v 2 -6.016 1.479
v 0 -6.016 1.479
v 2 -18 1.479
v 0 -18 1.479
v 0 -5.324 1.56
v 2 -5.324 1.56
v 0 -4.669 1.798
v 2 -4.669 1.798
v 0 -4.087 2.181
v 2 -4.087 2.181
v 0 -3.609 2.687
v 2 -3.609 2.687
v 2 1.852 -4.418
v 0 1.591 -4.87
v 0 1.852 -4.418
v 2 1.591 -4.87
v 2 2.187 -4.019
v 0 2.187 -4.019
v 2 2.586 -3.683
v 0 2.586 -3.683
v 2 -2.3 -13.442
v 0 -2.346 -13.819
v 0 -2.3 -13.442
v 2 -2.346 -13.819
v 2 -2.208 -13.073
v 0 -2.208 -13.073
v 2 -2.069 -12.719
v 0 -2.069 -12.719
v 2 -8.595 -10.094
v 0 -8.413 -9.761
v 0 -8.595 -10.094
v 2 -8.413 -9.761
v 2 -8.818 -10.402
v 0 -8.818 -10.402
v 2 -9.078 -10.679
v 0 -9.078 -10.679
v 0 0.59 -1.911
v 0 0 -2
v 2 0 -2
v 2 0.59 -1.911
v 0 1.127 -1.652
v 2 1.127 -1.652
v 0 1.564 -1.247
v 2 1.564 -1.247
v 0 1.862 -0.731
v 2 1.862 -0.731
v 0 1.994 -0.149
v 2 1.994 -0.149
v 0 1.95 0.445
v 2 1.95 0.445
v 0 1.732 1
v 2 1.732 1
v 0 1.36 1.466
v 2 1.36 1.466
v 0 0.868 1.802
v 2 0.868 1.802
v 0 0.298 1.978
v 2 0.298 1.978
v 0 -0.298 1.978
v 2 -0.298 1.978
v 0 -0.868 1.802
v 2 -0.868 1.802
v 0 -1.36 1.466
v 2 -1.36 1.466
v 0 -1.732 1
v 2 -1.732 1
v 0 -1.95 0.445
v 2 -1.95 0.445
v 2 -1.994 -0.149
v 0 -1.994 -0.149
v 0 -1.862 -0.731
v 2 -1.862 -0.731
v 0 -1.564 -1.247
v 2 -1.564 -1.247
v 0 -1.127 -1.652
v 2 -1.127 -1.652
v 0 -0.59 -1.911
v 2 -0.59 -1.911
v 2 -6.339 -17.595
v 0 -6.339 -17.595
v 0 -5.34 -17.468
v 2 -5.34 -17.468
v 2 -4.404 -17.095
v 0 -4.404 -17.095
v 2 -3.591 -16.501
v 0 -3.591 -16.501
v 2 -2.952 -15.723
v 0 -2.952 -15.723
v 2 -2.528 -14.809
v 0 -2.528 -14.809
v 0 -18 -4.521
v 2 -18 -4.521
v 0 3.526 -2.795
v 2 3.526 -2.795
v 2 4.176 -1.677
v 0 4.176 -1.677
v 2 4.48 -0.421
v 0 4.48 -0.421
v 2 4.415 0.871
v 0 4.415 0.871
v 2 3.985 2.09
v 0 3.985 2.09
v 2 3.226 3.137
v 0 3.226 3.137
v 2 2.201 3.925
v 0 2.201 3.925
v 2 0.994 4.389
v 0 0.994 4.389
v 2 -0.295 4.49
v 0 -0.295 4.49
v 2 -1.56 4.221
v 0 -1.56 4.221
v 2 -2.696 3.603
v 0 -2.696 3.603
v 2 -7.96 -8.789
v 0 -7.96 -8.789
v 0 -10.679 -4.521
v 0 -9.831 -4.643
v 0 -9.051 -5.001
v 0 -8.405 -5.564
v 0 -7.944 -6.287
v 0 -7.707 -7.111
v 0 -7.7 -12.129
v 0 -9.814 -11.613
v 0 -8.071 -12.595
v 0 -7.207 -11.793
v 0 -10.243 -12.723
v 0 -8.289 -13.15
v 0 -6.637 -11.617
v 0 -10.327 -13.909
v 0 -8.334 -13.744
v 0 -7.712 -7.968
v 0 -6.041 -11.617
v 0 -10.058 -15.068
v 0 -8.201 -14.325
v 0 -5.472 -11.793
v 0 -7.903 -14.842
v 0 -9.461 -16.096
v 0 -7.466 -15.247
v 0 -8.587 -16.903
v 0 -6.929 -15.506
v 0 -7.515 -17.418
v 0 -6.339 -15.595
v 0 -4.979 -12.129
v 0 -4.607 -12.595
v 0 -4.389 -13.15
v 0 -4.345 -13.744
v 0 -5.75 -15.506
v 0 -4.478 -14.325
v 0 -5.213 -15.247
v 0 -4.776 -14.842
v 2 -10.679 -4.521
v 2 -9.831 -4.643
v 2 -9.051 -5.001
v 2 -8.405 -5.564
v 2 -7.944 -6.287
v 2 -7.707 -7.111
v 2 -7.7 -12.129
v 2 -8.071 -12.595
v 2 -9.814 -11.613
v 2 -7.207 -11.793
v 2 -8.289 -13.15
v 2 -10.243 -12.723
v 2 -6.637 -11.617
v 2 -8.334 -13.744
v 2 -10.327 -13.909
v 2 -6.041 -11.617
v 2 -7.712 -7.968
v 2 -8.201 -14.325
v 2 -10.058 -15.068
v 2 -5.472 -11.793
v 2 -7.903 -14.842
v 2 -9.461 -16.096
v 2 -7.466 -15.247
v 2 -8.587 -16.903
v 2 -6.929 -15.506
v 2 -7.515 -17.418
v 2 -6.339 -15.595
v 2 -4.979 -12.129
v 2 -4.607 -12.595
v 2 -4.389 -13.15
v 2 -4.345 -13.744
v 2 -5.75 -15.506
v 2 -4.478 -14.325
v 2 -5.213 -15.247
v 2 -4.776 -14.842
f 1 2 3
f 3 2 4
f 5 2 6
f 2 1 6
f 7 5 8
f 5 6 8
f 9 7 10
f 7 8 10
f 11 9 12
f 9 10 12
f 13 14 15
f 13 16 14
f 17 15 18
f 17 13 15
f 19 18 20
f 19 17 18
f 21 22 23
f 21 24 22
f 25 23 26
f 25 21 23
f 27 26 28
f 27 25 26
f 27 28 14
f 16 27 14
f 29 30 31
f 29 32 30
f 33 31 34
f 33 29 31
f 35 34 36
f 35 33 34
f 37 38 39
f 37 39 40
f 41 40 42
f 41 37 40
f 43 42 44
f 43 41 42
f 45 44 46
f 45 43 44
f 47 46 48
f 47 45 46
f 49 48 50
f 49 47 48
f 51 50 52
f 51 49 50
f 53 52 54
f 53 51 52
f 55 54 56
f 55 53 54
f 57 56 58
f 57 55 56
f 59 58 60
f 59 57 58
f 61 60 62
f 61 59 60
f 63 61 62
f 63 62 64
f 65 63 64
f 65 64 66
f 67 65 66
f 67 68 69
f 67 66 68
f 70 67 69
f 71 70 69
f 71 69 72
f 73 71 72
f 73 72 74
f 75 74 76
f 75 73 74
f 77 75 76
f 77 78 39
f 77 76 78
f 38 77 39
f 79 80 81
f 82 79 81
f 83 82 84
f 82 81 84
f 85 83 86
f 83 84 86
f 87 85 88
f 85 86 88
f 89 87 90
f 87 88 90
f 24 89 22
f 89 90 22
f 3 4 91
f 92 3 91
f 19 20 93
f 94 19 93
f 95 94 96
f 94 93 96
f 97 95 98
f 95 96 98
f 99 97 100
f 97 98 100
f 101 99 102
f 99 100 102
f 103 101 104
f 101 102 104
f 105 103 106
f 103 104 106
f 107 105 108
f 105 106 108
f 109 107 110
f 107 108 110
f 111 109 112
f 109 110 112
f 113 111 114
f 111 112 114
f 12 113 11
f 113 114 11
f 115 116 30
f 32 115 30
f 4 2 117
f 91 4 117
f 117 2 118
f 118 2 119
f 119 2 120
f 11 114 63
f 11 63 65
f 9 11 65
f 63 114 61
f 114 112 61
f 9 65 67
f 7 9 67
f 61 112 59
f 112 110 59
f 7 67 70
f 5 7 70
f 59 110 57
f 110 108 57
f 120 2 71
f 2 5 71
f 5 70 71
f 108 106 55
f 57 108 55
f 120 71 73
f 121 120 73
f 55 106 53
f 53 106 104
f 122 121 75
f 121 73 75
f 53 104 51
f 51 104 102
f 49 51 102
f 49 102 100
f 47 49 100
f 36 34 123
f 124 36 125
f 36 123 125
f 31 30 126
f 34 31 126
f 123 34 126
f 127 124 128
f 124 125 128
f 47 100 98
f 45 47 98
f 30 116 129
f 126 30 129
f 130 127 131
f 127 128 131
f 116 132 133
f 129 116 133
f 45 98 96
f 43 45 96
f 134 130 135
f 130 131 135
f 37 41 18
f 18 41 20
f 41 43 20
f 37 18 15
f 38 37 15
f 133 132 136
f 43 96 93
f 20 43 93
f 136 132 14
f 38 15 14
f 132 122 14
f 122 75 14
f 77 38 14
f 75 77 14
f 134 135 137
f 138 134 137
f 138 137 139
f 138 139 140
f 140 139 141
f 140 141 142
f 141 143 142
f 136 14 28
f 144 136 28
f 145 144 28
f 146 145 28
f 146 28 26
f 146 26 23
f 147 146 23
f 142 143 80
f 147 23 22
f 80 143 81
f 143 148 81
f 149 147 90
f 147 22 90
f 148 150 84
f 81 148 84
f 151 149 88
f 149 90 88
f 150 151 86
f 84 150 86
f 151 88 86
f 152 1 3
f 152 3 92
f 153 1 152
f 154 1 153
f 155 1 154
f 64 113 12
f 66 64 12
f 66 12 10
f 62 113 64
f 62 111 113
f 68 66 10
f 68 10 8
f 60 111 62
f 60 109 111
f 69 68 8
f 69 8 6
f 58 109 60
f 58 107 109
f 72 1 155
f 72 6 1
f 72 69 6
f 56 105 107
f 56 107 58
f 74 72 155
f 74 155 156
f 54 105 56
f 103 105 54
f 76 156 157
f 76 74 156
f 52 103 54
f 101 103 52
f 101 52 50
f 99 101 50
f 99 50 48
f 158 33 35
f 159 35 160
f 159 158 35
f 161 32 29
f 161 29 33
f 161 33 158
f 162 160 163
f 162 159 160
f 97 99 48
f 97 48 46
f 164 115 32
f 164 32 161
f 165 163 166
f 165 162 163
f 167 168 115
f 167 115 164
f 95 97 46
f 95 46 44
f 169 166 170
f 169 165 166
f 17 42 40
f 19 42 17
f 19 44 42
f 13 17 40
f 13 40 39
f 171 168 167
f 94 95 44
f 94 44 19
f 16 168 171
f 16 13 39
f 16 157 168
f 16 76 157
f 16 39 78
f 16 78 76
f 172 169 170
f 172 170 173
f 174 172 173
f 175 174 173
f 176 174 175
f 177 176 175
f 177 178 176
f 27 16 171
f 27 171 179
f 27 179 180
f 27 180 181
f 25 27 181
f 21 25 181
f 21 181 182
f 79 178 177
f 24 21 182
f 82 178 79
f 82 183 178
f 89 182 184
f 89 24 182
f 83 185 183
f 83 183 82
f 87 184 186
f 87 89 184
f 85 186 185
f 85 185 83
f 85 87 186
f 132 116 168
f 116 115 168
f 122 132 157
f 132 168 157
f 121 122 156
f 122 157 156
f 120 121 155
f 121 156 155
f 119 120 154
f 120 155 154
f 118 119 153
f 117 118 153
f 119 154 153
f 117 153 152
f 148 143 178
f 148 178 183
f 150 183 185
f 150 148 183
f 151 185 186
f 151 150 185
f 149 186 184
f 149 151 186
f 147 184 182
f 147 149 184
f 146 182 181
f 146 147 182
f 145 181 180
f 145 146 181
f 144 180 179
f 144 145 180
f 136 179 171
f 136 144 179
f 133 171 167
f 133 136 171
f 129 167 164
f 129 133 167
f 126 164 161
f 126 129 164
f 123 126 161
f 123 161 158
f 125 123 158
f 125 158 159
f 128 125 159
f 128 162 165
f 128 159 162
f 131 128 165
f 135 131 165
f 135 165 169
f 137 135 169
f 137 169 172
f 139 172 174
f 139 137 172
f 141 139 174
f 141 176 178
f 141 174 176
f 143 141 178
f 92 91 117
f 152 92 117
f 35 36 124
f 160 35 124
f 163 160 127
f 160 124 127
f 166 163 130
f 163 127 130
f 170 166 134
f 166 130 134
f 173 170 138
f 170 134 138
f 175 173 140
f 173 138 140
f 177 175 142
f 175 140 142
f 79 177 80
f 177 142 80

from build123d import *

# Parameters (mm, degrees)
EXTRUDE_1_DEPTH          = 2
CUT_EXTRUDE_3_DEPTH      = 26.250159218
CUT_EXTRUDE_3_DEPTH_BACK = 26.250159218
SKETCH_1_3_R             = 2
FILLET_1_R               = 3


with BuildPart() as part:
    # 草图1 → 凸台-拉伸1 (new body)
    with BuildSketch(Plane(origin=(0, 0, 0), x_dir=(0, 0, -1), z_dir=(1, 0, 0))):
        with BuildLine():
            Line((1.479163916, 3.172077255), (-1.479163916, -3.172077255))
            Line((-1.479163916, -3.172077255), (3.19185305, -3.172077255))
            ThreePointArc((3.19185305, -3.172077255), (4.160128527, -1.715613779), (4.5, 0))
            ThreePointArc((4.5, 0), (4.384156276, 1.014482011), (4.042589444, 1.9767323))
            Line((4.042589444, 1.9767323), (1.479163916, 3.172077255))
        make_face()
        with BuildLine():
            Line((1.084261612, -4.36742221), (-1.479163916, -3.172077255))
            Line((-1.479163916, -3.172077255), (-1.479163916, -4.249949895))
            ThreePointArc((-1.479163916, -4.249949895), (-0.206002169, -4.495282317), (1.084261612, -4.36742221))
        make_face()
        with BuildLine():
            Line((3.19185305, -3.172077255), (-1.479163916, -3.172077255))
            Line((-1.479163916, -3.172077255), (1.084261612, -4.36742221))
            ThreePointArc((1.084261612, -4.36742221), (2.220022869, -3.914268573), (3.19185305, -3.172077255))
        make_face()
        with BuildLine():
            Line((-1.479163916, -4.249949895), (-1.479163916, -3.172077255))
            Line((-1.479163916, -3.172077255), (1.479163916, 3.172077255))
            Line((1.479163916, 3.172077255), (4.042589444, 1.9767323))
            ThreePointArc((4.042589444, 1.9767323), (-3.366850219, 2.985685784), (-1.479163916, -4.249949895))
        make_face()
        with BuildLine():
            ThreePointArc((4.5, 0), (4.160128527, -1.715613779), (3.19185305, -3.172077255))
            Line((3.19185305, -3.172077255), (4.520836084, -3.172077255))
            Line((4.520836084, -3.172077255), (4.520836084, -5.969923204))
            Line((4.520836084, -5.969923204), (10.360395407, -8.692954436))
            ThreePointArc((10.360395407, -8.692954436), (9.969385657, -4.648800879), (13.318723239, -2.348799927))
            Line((13.318723239, -2.348799927), (4.042589444, 1.9767323))
            ThreePointArc((4.042589444, 1.9767323), (4.384156276, 1.014482011), (4.5, 0))
        make_face()
        with BuildLine():
            Line((4.520836084, -3.172077255), (3.19185305, -3.172077255))
            ThreePointArc((3.19185305, -3.172077255), (2.220022869, -3.914268573), (1.084261612, -4.36742221))
            Line((1.084261612, -4.36742221), (4.520836084, -5.969923204))
            Line((4.520836084, -5.969923204), (4.520836084, -3.172077255))
        make_face()
        with BuildLine():
            ThreePointArc((1.084261612, -4.36742221), (-0.206002169, -4.495282317), (-1.479163916, -4.249949895))
            Line((-1.479163916, -4.249949895), (-1.479163916, -18))
            Line((-1.479163916, -18), (4.520836084, -18))
            Line((4.520836084, -18), (4.520836084, -5.969923204))
            Line((4.520836084, -5.969923204), (1.084261612, -4.36742221))
        make_face()
        with BuildLine():
            ThreePointArc((17.594616806, -6.339273926), (16.323758221, -3.414930045), (13.318723239, -2.348799927))
            Line((13.318723239, -2.348799927), (15.073780722, -3.167196671))
            Line((15.073780722, -3.167196671), (12.115452889, -9.511351181))
            Line((12.115452889, -9.511351181), (10.360395407, -8.692954436))
            ThreePointArc((10.360395407, -8.692954436), (14.832177795, -10.143014558), (17.594616806, -6.339273926))
        make_face()
        with BuildLine():
            Line((15.073780722, -3.167196671), (13.318723239, -2.348799927))
            ThreePointArc((13.318723239, -2.348799927), (9.969385657, -4.648800879), (10.360395407, -8.692954436))
            Line((10.360395407, -8.692954436), (12.115452889, -9.511351181))
            Line((12.115452889, -9.511351181), (15.073780722, -3.167196671))
        make_face()
    extrude(amount=EXTRUDE_1_DEPTH)

    # 草图1<3> → 切除-拉伸3 (cut, two sides: drawn at the far end of the back side and taken through both)
    with BuildSketch(Plane(origin=(0, 0, 0), x_dir=(0, 0, -1), z_dir=(1, 0, 0)).offset(-CUT_EXTRUDE_3_DEPTH_BACK)):
        Circle(SKETCH_1_3_R)
        with Locations((13.594616806, -6.339273926)):
            Circle(SKETCH_1_3_R)
    extrude(amount=CUT_EXTRUDE_3_DEPTH + CUT_EXTRUDE_3_DEPTH_BACK, mode=Mode.SUBTRACT)

    # 圆角1
    fillet_1_edges = [part.edges().sort_by_distance(p)[0] for p in [
        (1, -2.348799927, -13.318723239),
        (1, 1.9767323, -4.042589444),
        (1, -8.692954436, -10.360395407),
        (1, -5.969923204, -4.520836084),
        (1, -4.249949895, 1.479163916),
    ]]
    fillet(fillet_1_edges, radius=FILLET_1_R)


solid = part.part
